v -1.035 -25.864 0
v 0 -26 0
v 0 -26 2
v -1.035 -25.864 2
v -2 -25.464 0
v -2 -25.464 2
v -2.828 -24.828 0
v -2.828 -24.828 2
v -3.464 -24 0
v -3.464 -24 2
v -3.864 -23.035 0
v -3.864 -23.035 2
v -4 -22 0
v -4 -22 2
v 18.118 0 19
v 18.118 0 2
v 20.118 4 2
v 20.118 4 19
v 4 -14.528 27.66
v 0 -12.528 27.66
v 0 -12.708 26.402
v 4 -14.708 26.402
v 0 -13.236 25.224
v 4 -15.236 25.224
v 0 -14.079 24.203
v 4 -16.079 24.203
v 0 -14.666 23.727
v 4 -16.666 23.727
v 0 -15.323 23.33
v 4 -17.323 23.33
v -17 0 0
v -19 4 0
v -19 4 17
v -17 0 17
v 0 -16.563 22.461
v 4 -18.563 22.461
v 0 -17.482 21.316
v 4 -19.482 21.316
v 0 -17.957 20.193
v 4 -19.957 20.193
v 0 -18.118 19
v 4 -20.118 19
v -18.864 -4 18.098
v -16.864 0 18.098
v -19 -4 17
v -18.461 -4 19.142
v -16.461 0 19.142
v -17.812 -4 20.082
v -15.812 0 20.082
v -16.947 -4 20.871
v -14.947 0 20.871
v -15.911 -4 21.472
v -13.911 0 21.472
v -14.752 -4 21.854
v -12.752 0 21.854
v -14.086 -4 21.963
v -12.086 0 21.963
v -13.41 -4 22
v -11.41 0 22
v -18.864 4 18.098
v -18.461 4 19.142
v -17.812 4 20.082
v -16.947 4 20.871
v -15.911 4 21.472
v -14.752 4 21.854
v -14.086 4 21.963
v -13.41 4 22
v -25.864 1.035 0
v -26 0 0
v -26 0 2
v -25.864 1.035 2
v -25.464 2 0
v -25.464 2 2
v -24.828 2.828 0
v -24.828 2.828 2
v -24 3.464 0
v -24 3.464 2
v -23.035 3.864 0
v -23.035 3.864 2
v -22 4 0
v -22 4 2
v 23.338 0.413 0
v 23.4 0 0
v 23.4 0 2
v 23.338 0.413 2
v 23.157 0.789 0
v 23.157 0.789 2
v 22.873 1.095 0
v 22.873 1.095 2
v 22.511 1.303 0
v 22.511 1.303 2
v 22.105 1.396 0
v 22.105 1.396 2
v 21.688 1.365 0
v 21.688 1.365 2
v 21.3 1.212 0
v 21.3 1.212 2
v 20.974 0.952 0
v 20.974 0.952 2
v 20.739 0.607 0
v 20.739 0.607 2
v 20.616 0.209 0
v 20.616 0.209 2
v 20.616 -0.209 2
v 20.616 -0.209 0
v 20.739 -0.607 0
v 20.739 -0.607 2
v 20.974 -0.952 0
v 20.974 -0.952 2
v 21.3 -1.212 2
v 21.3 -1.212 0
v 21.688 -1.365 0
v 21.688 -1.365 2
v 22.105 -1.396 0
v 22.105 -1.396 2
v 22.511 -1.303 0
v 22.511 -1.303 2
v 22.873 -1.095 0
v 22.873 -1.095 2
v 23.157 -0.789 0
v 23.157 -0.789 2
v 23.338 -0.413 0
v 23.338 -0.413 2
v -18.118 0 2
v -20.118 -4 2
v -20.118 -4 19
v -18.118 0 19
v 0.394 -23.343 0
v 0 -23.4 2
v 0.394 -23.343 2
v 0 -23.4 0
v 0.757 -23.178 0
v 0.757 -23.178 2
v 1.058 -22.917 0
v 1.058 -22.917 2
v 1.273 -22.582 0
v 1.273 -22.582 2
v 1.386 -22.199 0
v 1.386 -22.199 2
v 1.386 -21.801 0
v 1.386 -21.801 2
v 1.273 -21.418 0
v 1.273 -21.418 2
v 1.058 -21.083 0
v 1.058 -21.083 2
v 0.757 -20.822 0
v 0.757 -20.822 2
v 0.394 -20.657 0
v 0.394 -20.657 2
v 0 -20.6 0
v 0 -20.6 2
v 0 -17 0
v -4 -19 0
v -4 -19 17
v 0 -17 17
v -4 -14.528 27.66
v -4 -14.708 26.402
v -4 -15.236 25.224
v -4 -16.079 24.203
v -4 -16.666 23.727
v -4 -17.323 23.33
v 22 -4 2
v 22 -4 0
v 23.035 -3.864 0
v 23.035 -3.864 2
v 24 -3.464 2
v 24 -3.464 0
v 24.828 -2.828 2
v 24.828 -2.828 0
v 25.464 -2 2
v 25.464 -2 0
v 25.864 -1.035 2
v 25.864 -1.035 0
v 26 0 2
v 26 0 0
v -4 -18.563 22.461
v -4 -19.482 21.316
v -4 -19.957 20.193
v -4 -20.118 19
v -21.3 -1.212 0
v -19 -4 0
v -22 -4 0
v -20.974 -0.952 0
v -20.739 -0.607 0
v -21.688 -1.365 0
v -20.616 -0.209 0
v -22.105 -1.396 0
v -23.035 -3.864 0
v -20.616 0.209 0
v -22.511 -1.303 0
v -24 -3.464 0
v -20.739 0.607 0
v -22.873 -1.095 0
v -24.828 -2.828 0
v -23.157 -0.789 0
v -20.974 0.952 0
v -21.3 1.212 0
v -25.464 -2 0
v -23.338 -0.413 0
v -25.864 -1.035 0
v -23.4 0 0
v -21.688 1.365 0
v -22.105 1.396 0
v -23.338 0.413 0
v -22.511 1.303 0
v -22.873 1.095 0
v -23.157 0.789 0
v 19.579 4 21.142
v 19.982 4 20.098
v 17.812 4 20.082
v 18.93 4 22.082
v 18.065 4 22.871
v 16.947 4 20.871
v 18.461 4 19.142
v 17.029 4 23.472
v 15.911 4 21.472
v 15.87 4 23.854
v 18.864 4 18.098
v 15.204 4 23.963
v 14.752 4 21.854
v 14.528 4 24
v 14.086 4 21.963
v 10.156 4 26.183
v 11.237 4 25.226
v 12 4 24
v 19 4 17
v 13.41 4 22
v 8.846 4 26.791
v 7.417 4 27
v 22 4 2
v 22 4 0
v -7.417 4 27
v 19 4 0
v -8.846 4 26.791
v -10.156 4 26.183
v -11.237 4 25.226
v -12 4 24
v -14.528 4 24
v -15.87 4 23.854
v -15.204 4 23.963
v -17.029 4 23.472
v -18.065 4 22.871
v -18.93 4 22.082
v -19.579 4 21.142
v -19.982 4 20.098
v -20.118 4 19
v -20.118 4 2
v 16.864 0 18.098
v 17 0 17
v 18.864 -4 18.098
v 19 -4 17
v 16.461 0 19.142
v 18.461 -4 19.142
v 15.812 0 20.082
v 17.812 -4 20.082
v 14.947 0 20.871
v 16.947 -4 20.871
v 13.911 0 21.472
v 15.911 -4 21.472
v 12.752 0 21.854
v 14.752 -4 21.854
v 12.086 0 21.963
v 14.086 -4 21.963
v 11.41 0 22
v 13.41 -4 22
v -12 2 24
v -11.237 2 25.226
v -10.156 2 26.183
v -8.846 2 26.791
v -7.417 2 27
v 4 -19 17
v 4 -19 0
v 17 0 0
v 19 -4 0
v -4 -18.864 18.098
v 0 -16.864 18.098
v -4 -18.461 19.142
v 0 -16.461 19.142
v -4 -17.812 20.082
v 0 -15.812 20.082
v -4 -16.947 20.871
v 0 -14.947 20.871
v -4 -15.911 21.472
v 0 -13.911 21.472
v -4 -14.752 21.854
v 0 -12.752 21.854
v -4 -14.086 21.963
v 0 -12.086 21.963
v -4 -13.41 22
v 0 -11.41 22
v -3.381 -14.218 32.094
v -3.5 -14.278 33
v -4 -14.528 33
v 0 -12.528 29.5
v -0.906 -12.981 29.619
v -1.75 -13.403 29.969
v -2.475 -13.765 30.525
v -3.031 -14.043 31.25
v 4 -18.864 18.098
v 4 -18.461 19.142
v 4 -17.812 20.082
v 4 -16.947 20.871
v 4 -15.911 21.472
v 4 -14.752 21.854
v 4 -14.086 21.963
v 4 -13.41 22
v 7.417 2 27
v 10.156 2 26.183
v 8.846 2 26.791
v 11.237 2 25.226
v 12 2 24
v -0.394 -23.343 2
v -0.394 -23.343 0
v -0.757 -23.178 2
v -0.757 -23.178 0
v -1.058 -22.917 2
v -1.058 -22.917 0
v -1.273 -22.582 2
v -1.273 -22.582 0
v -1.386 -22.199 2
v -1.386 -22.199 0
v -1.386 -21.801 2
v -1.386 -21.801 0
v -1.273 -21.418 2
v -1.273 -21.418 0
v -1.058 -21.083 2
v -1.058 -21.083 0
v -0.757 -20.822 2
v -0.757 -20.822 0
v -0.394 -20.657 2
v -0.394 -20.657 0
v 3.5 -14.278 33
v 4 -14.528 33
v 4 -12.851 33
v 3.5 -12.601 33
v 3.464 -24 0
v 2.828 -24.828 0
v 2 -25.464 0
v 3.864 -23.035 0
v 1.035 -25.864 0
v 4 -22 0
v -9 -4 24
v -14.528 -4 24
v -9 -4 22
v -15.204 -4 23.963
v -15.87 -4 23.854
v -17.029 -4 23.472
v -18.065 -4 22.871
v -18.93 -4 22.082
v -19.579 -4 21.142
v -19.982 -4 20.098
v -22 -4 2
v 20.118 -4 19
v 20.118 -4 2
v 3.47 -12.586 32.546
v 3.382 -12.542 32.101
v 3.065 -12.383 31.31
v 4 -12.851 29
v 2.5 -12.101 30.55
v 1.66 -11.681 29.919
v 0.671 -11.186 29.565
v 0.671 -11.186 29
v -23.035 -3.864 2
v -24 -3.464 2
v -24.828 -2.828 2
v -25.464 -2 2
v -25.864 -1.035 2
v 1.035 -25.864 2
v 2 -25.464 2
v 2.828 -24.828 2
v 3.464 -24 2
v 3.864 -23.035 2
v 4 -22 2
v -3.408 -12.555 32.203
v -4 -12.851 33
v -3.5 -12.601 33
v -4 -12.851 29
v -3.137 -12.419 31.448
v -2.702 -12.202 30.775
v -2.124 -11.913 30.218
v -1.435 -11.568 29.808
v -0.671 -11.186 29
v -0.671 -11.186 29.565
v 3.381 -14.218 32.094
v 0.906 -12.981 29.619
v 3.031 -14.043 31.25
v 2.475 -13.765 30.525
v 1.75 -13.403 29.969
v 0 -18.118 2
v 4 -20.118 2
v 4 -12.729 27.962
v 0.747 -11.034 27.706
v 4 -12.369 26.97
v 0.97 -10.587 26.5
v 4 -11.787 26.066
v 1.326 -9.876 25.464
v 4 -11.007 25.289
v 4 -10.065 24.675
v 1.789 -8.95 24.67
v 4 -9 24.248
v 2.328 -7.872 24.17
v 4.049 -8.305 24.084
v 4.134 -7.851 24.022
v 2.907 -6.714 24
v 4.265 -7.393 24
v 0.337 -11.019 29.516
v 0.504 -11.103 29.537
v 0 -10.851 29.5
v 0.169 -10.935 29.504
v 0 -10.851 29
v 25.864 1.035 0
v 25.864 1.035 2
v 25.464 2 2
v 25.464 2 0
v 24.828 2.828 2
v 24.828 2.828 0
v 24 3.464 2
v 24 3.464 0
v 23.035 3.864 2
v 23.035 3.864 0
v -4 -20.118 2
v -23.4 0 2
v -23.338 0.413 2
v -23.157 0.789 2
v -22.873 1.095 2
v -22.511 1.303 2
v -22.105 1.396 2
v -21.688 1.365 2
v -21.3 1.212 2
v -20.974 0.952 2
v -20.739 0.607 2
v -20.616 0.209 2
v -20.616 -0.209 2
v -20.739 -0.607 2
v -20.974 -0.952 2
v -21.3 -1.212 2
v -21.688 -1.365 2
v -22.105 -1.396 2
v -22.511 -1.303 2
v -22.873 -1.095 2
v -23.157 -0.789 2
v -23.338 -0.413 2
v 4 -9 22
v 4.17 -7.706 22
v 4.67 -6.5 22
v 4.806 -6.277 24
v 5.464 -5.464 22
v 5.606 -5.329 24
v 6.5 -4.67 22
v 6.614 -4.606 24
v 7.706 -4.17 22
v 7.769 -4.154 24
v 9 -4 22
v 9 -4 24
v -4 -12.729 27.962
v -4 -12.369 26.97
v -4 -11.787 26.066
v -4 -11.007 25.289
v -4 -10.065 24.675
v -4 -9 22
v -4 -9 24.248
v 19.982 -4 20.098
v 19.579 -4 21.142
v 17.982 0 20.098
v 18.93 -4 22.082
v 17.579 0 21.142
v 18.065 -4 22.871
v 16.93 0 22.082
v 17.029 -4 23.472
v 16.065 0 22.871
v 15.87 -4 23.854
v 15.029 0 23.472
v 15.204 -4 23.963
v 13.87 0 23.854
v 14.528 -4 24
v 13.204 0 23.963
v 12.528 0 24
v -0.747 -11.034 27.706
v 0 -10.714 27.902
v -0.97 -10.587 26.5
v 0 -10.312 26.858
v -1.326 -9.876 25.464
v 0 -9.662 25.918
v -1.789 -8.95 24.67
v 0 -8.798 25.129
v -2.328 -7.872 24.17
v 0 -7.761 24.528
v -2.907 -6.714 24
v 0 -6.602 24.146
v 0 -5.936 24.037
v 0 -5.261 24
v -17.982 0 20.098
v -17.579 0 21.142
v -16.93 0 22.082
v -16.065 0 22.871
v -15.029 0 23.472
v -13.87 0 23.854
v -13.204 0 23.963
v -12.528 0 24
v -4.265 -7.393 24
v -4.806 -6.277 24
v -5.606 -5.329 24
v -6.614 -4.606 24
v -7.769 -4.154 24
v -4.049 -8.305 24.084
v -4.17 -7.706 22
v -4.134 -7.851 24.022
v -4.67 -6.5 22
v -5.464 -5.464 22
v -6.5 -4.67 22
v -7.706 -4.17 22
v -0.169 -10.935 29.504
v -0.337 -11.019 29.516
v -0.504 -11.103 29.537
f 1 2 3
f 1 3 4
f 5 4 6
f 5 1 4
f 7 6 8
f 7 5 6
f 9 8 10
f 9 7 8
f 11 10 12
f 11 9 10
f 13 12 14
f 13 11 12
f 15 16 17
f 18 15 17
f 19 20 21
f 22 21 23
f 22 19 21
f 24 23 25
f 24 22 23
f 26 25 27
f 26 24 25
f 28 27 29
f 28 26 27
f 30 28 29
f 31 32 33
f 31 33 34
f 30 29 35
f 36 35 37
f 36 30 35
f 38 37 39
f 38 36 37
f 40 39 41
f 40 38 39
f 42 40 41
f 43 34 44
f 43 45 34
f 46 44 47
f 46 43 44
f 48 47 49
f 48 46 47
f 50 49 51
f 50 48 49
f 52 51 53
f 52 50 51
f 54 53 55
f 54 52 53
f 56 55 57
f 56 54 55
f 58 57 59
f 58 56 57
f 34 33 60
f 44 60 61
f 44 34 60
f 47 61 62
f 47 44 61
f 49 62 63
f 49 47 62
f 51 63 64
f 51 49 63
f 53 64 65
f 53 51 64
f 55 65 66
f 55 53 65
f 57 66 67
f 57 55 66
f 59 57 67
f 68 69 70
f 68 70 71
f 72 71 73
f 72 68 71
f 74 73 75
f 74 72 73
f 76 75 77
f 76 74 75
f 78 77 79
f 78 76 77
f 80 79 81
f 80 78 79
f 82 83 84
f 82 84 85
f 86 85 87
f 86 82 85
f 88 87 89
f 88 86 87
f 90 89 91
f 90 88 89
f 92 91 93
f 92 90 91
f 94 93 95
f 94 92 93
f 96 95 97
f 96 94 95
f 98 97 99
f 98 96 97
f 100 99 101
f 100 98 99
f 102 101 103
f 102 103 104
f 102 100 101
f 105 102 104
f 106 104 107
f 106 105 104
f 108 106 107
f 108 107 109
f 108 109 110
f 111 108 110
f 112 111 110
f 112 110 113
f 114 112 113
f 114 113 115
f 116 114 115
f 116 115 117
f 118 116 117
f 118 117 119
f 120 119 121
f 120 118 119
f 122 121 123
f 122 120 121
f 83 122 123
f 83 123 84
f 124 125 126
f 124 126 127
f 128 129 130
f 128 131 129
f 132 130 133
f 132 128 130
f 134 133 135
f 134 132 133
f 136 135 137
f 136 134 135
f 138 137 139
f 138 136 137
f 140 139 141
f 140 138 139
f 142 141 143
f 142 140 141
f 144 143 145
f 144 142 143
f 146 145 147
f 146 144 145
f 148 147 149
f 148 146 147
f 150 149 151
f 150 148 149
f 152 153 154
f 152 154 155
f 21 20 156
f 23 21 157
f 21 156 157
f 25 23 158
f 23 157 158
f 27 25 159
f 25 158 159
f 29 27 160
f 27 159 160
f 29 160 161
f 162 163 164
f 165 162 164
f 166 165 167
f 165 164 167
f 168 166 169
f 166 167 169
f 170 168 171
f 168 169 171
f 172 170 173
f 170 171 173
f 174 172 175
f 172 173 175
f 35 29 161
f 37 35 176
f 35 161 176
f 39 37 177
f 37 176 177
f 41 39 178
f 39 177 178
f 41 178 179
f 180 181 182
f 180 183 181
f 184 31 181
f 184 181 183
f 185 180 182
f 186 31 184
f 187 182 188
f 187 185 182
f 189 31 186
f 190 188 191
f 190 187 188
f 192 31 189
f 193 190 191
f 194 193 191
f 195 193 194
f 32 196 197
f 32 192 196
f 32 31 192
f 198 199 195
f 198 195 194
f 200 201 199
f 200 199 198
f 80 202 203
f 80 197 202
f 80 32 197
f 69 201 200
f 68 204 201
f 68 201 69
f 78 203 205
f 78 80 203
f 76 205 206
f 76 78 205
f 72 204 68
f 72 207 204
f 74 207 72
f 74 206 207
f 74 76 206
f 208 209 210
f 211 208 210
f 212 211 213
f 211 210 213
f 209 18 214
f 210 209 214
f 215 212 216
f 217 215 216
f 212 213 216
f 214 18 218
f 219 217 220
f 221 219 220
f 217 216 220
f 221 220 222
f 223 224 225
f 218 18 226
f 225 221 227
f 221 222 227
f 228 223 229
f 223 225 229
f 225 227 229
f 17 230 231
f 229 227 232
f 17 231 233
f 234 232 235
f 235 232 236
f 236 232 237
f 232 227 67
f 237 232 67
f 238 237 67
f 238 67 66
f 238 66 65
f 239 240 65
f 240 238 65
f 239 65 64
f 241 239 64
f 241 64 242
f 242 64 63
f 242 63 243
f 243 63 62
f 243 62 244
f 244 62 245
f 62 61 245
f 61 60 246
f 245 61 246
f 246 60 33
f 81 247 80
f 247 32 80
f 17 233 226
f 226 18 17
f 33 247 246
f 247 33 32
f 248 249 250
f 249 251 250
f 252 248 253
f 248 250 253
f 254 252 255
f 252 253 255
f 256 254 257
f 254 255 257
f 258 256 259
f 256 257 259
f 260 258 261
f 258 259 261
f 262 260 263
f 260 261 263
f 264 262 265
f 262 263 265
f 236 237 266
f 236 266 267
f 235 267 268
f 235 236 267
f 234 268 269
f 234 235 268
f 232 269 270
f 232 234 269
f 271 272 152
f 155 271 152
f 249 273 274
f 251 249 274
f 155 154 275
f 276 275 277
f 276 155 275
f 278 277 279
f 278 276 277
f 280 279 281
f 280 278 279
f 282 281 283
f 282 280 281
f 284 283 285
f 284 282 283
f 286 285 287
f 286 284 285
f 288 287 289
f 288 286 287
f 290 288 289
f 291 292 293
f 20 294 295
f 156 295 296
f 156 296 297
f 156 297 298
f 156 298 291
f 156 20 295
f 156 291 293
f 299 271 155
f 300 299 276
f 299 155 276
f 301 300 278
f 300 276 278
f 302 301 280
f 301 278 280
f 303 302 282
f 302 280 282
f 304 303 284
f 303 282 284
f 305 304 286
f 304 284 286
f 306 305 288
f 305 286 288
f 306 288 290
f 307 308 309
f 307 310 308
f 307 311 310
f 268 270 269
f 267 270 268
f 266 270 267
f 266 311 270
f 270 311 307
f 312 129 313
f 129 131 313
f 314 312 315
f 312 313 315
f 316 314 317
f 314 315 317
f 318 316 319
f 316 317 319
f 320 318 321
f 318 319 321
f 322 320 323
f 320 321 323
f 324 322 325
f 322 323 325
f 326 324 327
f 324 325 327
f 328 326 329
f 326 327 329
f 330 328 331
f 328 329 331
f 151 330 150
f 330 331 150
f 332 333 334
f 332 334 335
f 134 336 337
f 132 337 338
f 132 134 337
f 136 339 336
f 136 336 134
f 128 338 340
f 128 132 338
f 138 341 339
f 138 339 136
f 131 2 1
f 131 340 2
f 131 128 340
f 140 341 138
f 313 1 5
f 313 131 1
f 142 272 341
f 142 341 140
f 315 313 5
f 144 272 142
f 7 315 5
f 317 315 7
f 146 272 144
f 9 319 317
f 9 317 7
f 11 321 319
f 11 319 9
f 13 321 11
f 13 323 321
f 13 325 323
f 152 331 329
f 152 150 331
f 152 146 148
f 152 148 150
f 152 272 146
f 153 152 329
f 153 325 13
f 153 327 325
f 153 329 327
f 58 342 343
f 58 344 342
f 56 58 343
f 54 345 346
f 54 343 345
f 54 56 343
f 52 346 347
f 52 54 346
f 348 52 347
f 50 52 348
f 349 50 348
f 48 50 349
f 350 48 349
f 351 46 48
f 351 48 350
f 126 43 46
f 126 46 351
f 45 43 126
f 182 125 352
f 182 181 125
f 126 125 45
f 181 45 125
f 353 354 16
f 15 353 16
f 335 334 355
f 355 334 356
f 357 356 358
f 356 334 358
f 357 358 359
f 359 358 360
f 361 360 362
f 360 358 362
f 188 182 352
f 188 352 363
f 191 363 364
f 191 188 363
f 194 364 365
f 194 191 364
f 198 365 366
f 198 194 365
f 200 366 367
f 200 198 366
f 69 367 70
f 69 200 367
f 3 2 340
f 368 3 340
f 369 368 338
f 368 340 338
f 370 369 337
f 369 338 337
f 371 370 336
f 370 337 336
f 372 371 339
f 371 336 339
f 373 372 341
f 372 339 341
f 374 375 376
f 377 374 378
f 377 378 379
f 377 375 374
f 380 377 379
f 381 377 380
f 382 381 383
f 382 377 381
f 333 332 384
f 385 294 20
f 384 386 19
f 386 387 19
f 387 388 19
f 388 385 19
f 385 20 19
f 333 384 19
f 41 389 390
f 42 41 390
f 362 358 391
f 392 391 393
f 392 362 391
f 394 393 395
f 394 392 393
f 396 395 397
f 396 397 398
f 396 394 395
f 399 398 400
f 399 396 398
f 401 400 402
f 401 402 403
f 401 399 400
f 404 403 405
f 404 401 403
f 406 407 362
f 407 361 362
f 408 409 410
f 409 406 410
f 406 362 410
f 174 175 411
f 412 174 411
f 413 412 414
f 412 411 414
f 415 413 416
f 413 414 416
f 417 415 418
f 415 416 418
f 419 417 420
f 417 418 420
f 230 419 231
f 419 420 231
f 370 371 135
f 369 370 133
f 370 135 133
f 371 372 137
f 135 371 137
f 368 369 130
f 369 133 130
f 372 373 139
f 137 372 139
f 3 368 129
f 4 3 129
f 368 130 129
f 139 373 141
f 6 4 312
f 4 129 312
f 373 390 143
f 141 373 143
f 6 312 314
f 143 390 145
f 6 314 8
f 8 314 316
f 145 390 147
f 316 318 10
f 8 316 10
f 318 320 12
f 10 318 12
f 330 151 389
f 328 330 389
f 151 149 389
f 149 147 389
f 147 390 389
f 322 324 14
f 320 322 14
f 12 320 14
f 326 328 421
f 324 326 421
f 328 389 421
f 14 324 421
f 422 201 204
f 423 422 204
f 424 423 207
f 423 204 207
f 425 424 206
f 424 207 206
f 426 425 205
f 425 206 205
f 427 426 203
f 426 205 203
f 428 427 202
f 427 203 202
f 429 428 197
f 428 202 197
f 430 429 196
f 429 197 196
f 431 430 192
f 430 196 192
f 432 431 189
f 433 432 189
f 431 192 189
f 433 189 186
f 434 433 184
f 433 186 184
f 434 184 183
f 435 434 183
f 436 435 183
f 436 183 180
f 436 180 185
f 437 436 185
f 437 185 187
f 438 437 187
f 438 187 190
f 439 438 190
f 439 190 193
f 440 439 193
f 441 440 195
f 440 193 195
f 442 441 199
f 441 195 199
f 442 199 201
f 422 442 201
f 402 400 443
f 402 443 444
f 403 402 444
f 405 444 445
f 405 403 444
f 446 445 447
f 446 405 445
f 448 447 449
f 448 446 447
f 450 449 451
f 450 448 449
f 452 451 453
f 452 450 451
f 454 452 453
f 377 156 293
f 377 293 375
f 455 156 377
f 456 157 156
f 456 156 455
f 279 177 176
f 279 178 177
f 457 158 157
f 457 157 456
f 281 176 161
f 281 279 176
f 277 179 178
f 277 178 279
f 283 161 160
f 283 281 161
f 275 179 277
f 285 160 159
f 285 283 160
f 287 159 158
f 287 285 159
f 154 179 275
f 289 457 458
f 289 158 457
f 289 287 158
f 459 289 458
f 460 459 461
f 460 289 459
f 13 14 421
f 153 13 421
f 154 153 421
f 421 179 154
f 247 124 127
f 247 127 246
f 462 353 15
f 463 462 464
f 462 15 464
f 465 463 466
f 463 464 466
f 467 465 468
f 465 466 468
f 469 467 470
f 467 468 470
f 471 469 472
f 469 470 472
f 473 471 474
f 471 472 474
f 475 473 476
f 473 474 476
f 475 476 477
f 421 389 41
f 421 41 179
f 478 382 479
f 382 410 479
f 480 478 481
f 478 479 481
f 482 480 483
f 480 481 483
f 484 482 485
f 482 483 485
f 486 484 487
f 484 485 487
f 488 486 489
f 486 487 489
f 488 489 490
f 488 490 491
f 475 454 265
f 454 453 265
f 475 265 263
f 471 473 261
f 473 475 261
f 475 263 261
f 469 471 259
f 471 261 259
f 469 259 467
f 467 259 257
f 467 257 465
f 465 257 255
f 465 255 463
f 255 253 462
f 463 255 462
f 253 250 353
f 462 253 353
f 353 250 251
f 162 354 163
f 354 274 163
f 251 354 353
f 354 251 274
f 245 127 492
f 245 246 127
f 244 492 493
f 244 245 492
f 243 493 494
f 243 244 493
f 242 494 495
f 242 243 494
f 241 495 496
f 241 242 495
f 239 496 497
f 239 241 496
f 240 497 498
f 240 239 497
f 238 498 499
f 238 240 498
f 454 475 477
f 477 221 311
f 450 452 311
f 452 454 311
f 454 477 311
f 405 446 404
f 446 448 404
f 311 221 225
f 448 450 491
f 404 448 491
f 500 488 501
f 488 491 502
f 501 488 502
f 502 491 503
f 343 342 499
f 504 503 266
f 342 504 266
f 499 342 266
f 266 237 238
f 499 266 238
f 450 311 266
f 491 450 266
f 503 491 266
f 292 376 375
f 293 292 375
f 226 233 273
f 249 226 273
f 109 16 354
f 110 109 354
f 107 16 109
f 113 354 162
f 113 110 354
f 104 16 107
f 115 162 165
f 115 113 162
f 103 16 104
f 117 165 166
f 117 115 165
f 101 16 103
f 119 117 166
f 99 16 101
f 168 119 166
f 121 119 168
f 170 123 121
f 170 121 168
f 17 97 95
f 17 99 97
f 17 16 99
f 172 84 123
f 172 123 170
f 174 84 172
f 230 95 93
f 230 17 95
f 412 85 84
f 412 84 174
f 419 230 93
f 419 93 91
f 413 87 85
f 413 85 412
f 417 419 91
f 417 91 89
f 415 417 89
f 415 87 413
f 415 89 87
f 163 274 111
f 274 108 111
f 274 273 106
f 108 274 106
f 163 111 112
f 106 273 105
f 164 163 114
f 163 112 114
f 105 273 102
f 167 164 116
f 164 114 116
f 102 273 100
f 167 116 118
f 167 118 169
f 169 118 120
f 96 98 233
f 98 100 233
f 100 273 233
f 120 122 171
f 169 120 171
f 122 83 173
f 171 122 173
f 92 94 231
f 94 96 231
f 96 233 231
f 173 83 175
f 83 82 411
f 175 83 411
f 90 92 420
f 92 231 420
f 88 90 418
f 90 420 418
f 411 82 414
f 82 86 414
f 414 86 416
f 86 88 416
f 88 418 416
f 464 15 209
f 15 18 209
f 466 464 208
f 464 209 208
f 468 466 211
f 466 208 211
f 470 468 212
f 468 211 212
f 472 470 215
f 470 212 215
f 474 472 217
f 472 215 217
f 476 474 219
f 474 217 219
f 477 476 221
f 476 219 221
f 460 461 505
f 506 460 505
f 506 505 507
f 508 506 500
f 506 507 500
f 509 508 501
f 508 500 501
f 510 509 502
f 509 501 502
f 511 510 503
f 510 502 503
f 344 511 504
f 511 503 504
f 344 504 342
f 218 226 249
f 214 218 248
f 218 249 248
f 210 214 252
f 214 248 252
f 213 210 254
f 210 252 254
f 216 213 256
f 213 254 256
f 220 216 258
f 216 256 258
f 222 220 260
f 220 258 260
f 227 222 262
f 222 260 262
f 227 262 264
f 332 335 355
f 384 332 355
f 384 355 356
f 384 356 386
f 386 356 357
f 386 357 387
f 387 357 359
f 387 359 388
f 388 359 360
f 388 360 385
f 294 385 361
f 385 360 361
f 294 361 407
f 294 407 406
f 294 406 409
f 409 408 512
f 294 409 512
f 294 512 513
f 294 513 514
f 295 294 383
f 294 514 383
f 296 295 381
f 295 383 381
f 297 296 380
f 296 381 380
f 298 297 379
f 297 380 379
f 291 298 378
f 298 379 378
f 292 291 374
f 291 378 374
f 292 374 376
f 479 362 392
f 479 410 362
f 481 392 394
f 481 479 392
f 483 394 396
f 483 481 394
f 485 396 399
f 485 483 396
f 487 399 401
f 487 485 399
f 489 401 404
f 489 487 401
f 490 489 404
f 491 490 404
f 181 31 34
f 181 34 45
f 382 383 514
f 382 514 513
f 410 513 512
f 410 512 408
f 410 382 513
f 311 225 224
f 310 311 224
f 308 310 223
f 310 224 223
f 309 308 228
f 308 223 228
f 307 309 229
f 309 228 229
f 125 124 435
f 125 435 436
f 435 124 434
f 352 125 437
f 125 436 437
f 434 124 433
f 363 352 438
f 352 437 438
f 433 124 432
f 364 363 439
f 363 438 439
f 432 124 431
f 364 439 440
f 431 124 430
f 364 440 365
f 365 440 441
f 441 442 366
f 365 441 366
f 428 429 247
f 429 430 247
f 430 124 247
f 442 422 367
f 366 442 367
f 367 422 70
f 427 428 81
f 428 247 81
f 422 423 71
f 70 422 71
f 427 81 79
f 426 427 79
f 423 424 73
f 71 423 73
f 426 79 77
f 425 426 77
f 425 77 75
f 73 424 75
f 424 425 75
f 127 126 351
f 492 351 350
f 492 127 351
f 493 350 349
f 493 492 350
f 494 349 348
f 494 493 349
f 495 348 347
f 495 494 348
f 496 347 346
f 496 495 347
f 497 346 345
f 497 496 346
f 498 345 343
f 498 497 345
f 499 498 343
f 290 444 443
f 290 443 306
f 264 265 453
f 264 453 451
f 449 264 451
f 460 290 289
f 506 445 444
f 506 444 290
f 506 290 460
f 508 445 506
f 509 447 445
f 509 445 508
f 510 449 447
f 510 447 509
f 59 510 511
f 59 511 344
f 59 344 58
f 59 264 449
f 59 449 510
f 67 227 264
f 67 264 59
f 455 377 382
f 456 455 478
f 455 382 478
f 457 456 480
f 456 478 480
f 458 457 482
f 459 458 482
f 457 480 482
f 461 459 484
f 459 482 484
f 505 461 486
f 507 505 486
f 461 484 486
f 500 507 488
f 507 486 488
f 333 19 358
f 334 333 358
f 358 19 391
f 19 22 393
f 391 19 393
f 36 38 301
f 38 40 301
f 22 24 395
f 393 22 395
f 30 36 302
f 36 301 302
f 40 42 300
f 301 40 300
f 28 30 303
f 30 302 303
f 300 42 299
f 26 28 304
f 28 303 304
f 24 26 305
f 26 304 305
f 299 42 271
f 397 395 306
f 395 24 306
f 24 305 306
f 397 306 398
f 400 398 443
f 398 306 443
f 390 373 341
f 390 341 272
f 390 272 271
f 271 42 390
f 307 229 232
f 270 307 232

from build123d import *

# Parameters (mm, degrees)
F0_R         = 1.4
F1_DEPTH     = 2
F3_DEPTH     = 20
F5_DEPTH     = 2
F6_W         = 24.2574699223
F6_H         = 65.0979466736
F7_DEPTH     = 25
F8_R         = 5
F10_DEPTH    = 9
F11_R        = 5
F12_W        = 12
F12_H        = 2
F13_DEPTH    = 3
F14_T1_DEPTH = 24.9128784748
F16_R        = 3.5
F17_DEPTH    = 25


# Not quite as in the source:
# - a fillet or chamfer that OpenCascade refuses, or shapes differently, is made with other operations: its cross-section is extruded or revolved along the edge and cut away or added


with BuildPart() as f1:
    # F0 (on Top) → F1 (new body)
    with BuildSketch(Plane.XY):
        with BuildLine():
            ThreePointArc((22, -4), (24.8284271247, -2.8284271247), (26, 0))
            ThreePointArc((26, 0), (24.8284271247, 2.8284271247), (22, 4))
            ThreePointArc((22, 4), (18, 0), (22, -4))
        make_face()
        with Locations((22, 0)):
            Circle(F0_R, mode=Mode.SUBTRACT)
        with BuildLine():
            ThreePointArc((22, -4), (18, 0), (22, 4))
            Line((22, 4), (19, 4))
            Line((19, 4), (17, 0))
            Line((17, 0), (19, -4))
            Line((19, -4), (22, -4))
        make_face()
    extrude(amount=F1_DEPTH)

    # F2 (on face) → F3 (join)
    with BuildSketch(Plane.XY.offset(2)):
        Polygon((19, 4), (17, 0), (19, -4), (20.1180339887, -4), (18.1180339887, 0), (20.1180339887, 4), align=None)
    extrude(amount=F3_DEPTH)



with BuildPart() as f1b:
    # F0 (on Top) → F1, piece 2 (new body)
    with BuildSketch(Plane.XY):
        with BuildLine():
            ThreePointArc((-4, -22), (0, -26), (4, -22))
            ThreePointArc((4, -22), (0, -18), (-4, -22))
        make_face()
        with Locations((0, -22)):
            Circle(F0_R, mode=Mode.SUBTRACT)
        with BuildLine():
            ThreePointArc((-4, -22), (0, -18), (4, -22))
            Line((4, -22), (4, -19))
            Line((4, -19), (0, -17))
            Line((0, -17), (-4, -19))
            Line((-4, -19), (-4, -22))
        make_face()
    extrude(amount=F1_DEPTH)

    # F2 (on face) → F3, piece 2 (join)
    with BuildSketch(Plane.XY.offset(2)):
        Polygon((4, -19), (0, -17), (-4, -19), (-4, -20.1180339887), (0, -18.1180339887), (4, -20.1180339887), align=None)
    extrude(amount=F3_DEPTH)


with BuildPart() as f1_1:
    add(f1.part)

    add(f1b.part)  # F5 merges F1b
    # F4 (on face) → F5 (join)
    with BuildSketch(Plane.XY.offset(22)):
        Polygon((4, -20.1180339887), (4, -4), (0, -4), (0, -18.1180339887), align=None)
        Polygon((17, 0), (19, 4), (0, 4), (0, -4), (4, -4), (19, -4), align=None)
        Polygon((18.1180339887, 0), (20.1180339887, 4), (19, 4), (17, 0), (19, -4), (20.1180339887, -4), align=None)
    extrude(amount=F5_DEPTH)

    # F6 (on face) → F7 (cut)
    with BuildSketch(Plane.XY.offset(24)):
        with Locations((-12.1287349612, -10.913932696)):
            Rectangle(F6_W, F6_H)
    extrude(amount=-F7_DEPTH, mode=Mode.SUBTRACT)

    # F8
    f8_edges = [f1_1.edges().sort_by_distance(p)[0] for p in [
        (4, -4, 23),
        (2, -18, 22),
        (18, -2, 22),
        (18, 2, 22),
        (19.118034, -2, 24),
        (19.118034, 2, 24),
        (2, -19.118034, 24),
    ]]
    fillet(f8_edges, radius=F8_R)

    # F9 (on face) → F10 (join)
    with BuildSketch(Plane.XY.offset(24)):
        Polygon((0, -10.8508134726), (0, -12.527864045), (4, -14.527864045), (4, -12.8508134726), (0.6708202289, -11.1862235871), align=None)
    extrude(amount=F10_DEPTH)

    # F11
    f11_edges = [f1_1.edges().sort_by_distance(p)[0] for p in [
        (2, -11.850813, 24),
        (2, -13.527864, 24),
    ]]
    fillet(f11_edges, radius=F11_R)

    # F12 (on face) → F13 (join)
    with BuildSketch(Plane.XY.offset(24)):
        with Locations((6, 3)):
            Rectangle(F12_W, F12_H)
    extrude(amount=F13_DEPTH)

    # F14: fillet of radius 5 on 1 edges, made by hand

    # F14_s2 → F14_t1 (cut)
    with BuildSketch(Plane.XZ.offset(-15.4564392374)):
        with BuildLine():
            ThreePointArc((12, 24), (10.1560370926, 26.1833001327), (7.417424305, 27))
            Line((7.417424305, 27), (12, 27))
            Line((12, 27), (12, 24))
        make_face()
    extrude(amount=F14_T1_DEPTH, mode=Mode.SUBTRACT)

    # F15: F1 across face


with BuildPart() as f1_2:
    add(f1_1.part)
    add(f1_1.part.mirror(Plane(origin=(0, -10.4635359507, 20.0753373273), x_dir=(0, -1, 0), z_dir=(-1, 0, 0))))

    # F16 (on face) → F17 (cut)
    with BuildSketch(Plane(origin=(0, 4, 0), x_dir=(-1, 0, 0), z_dir=(0, 1, 0))):
        with Locations((0, 33)):
            Circle(F16_R)
    extrude(amount=-F17_DEPTH, mode=Mode.SUBTRACT)


solid = f1_2.part
